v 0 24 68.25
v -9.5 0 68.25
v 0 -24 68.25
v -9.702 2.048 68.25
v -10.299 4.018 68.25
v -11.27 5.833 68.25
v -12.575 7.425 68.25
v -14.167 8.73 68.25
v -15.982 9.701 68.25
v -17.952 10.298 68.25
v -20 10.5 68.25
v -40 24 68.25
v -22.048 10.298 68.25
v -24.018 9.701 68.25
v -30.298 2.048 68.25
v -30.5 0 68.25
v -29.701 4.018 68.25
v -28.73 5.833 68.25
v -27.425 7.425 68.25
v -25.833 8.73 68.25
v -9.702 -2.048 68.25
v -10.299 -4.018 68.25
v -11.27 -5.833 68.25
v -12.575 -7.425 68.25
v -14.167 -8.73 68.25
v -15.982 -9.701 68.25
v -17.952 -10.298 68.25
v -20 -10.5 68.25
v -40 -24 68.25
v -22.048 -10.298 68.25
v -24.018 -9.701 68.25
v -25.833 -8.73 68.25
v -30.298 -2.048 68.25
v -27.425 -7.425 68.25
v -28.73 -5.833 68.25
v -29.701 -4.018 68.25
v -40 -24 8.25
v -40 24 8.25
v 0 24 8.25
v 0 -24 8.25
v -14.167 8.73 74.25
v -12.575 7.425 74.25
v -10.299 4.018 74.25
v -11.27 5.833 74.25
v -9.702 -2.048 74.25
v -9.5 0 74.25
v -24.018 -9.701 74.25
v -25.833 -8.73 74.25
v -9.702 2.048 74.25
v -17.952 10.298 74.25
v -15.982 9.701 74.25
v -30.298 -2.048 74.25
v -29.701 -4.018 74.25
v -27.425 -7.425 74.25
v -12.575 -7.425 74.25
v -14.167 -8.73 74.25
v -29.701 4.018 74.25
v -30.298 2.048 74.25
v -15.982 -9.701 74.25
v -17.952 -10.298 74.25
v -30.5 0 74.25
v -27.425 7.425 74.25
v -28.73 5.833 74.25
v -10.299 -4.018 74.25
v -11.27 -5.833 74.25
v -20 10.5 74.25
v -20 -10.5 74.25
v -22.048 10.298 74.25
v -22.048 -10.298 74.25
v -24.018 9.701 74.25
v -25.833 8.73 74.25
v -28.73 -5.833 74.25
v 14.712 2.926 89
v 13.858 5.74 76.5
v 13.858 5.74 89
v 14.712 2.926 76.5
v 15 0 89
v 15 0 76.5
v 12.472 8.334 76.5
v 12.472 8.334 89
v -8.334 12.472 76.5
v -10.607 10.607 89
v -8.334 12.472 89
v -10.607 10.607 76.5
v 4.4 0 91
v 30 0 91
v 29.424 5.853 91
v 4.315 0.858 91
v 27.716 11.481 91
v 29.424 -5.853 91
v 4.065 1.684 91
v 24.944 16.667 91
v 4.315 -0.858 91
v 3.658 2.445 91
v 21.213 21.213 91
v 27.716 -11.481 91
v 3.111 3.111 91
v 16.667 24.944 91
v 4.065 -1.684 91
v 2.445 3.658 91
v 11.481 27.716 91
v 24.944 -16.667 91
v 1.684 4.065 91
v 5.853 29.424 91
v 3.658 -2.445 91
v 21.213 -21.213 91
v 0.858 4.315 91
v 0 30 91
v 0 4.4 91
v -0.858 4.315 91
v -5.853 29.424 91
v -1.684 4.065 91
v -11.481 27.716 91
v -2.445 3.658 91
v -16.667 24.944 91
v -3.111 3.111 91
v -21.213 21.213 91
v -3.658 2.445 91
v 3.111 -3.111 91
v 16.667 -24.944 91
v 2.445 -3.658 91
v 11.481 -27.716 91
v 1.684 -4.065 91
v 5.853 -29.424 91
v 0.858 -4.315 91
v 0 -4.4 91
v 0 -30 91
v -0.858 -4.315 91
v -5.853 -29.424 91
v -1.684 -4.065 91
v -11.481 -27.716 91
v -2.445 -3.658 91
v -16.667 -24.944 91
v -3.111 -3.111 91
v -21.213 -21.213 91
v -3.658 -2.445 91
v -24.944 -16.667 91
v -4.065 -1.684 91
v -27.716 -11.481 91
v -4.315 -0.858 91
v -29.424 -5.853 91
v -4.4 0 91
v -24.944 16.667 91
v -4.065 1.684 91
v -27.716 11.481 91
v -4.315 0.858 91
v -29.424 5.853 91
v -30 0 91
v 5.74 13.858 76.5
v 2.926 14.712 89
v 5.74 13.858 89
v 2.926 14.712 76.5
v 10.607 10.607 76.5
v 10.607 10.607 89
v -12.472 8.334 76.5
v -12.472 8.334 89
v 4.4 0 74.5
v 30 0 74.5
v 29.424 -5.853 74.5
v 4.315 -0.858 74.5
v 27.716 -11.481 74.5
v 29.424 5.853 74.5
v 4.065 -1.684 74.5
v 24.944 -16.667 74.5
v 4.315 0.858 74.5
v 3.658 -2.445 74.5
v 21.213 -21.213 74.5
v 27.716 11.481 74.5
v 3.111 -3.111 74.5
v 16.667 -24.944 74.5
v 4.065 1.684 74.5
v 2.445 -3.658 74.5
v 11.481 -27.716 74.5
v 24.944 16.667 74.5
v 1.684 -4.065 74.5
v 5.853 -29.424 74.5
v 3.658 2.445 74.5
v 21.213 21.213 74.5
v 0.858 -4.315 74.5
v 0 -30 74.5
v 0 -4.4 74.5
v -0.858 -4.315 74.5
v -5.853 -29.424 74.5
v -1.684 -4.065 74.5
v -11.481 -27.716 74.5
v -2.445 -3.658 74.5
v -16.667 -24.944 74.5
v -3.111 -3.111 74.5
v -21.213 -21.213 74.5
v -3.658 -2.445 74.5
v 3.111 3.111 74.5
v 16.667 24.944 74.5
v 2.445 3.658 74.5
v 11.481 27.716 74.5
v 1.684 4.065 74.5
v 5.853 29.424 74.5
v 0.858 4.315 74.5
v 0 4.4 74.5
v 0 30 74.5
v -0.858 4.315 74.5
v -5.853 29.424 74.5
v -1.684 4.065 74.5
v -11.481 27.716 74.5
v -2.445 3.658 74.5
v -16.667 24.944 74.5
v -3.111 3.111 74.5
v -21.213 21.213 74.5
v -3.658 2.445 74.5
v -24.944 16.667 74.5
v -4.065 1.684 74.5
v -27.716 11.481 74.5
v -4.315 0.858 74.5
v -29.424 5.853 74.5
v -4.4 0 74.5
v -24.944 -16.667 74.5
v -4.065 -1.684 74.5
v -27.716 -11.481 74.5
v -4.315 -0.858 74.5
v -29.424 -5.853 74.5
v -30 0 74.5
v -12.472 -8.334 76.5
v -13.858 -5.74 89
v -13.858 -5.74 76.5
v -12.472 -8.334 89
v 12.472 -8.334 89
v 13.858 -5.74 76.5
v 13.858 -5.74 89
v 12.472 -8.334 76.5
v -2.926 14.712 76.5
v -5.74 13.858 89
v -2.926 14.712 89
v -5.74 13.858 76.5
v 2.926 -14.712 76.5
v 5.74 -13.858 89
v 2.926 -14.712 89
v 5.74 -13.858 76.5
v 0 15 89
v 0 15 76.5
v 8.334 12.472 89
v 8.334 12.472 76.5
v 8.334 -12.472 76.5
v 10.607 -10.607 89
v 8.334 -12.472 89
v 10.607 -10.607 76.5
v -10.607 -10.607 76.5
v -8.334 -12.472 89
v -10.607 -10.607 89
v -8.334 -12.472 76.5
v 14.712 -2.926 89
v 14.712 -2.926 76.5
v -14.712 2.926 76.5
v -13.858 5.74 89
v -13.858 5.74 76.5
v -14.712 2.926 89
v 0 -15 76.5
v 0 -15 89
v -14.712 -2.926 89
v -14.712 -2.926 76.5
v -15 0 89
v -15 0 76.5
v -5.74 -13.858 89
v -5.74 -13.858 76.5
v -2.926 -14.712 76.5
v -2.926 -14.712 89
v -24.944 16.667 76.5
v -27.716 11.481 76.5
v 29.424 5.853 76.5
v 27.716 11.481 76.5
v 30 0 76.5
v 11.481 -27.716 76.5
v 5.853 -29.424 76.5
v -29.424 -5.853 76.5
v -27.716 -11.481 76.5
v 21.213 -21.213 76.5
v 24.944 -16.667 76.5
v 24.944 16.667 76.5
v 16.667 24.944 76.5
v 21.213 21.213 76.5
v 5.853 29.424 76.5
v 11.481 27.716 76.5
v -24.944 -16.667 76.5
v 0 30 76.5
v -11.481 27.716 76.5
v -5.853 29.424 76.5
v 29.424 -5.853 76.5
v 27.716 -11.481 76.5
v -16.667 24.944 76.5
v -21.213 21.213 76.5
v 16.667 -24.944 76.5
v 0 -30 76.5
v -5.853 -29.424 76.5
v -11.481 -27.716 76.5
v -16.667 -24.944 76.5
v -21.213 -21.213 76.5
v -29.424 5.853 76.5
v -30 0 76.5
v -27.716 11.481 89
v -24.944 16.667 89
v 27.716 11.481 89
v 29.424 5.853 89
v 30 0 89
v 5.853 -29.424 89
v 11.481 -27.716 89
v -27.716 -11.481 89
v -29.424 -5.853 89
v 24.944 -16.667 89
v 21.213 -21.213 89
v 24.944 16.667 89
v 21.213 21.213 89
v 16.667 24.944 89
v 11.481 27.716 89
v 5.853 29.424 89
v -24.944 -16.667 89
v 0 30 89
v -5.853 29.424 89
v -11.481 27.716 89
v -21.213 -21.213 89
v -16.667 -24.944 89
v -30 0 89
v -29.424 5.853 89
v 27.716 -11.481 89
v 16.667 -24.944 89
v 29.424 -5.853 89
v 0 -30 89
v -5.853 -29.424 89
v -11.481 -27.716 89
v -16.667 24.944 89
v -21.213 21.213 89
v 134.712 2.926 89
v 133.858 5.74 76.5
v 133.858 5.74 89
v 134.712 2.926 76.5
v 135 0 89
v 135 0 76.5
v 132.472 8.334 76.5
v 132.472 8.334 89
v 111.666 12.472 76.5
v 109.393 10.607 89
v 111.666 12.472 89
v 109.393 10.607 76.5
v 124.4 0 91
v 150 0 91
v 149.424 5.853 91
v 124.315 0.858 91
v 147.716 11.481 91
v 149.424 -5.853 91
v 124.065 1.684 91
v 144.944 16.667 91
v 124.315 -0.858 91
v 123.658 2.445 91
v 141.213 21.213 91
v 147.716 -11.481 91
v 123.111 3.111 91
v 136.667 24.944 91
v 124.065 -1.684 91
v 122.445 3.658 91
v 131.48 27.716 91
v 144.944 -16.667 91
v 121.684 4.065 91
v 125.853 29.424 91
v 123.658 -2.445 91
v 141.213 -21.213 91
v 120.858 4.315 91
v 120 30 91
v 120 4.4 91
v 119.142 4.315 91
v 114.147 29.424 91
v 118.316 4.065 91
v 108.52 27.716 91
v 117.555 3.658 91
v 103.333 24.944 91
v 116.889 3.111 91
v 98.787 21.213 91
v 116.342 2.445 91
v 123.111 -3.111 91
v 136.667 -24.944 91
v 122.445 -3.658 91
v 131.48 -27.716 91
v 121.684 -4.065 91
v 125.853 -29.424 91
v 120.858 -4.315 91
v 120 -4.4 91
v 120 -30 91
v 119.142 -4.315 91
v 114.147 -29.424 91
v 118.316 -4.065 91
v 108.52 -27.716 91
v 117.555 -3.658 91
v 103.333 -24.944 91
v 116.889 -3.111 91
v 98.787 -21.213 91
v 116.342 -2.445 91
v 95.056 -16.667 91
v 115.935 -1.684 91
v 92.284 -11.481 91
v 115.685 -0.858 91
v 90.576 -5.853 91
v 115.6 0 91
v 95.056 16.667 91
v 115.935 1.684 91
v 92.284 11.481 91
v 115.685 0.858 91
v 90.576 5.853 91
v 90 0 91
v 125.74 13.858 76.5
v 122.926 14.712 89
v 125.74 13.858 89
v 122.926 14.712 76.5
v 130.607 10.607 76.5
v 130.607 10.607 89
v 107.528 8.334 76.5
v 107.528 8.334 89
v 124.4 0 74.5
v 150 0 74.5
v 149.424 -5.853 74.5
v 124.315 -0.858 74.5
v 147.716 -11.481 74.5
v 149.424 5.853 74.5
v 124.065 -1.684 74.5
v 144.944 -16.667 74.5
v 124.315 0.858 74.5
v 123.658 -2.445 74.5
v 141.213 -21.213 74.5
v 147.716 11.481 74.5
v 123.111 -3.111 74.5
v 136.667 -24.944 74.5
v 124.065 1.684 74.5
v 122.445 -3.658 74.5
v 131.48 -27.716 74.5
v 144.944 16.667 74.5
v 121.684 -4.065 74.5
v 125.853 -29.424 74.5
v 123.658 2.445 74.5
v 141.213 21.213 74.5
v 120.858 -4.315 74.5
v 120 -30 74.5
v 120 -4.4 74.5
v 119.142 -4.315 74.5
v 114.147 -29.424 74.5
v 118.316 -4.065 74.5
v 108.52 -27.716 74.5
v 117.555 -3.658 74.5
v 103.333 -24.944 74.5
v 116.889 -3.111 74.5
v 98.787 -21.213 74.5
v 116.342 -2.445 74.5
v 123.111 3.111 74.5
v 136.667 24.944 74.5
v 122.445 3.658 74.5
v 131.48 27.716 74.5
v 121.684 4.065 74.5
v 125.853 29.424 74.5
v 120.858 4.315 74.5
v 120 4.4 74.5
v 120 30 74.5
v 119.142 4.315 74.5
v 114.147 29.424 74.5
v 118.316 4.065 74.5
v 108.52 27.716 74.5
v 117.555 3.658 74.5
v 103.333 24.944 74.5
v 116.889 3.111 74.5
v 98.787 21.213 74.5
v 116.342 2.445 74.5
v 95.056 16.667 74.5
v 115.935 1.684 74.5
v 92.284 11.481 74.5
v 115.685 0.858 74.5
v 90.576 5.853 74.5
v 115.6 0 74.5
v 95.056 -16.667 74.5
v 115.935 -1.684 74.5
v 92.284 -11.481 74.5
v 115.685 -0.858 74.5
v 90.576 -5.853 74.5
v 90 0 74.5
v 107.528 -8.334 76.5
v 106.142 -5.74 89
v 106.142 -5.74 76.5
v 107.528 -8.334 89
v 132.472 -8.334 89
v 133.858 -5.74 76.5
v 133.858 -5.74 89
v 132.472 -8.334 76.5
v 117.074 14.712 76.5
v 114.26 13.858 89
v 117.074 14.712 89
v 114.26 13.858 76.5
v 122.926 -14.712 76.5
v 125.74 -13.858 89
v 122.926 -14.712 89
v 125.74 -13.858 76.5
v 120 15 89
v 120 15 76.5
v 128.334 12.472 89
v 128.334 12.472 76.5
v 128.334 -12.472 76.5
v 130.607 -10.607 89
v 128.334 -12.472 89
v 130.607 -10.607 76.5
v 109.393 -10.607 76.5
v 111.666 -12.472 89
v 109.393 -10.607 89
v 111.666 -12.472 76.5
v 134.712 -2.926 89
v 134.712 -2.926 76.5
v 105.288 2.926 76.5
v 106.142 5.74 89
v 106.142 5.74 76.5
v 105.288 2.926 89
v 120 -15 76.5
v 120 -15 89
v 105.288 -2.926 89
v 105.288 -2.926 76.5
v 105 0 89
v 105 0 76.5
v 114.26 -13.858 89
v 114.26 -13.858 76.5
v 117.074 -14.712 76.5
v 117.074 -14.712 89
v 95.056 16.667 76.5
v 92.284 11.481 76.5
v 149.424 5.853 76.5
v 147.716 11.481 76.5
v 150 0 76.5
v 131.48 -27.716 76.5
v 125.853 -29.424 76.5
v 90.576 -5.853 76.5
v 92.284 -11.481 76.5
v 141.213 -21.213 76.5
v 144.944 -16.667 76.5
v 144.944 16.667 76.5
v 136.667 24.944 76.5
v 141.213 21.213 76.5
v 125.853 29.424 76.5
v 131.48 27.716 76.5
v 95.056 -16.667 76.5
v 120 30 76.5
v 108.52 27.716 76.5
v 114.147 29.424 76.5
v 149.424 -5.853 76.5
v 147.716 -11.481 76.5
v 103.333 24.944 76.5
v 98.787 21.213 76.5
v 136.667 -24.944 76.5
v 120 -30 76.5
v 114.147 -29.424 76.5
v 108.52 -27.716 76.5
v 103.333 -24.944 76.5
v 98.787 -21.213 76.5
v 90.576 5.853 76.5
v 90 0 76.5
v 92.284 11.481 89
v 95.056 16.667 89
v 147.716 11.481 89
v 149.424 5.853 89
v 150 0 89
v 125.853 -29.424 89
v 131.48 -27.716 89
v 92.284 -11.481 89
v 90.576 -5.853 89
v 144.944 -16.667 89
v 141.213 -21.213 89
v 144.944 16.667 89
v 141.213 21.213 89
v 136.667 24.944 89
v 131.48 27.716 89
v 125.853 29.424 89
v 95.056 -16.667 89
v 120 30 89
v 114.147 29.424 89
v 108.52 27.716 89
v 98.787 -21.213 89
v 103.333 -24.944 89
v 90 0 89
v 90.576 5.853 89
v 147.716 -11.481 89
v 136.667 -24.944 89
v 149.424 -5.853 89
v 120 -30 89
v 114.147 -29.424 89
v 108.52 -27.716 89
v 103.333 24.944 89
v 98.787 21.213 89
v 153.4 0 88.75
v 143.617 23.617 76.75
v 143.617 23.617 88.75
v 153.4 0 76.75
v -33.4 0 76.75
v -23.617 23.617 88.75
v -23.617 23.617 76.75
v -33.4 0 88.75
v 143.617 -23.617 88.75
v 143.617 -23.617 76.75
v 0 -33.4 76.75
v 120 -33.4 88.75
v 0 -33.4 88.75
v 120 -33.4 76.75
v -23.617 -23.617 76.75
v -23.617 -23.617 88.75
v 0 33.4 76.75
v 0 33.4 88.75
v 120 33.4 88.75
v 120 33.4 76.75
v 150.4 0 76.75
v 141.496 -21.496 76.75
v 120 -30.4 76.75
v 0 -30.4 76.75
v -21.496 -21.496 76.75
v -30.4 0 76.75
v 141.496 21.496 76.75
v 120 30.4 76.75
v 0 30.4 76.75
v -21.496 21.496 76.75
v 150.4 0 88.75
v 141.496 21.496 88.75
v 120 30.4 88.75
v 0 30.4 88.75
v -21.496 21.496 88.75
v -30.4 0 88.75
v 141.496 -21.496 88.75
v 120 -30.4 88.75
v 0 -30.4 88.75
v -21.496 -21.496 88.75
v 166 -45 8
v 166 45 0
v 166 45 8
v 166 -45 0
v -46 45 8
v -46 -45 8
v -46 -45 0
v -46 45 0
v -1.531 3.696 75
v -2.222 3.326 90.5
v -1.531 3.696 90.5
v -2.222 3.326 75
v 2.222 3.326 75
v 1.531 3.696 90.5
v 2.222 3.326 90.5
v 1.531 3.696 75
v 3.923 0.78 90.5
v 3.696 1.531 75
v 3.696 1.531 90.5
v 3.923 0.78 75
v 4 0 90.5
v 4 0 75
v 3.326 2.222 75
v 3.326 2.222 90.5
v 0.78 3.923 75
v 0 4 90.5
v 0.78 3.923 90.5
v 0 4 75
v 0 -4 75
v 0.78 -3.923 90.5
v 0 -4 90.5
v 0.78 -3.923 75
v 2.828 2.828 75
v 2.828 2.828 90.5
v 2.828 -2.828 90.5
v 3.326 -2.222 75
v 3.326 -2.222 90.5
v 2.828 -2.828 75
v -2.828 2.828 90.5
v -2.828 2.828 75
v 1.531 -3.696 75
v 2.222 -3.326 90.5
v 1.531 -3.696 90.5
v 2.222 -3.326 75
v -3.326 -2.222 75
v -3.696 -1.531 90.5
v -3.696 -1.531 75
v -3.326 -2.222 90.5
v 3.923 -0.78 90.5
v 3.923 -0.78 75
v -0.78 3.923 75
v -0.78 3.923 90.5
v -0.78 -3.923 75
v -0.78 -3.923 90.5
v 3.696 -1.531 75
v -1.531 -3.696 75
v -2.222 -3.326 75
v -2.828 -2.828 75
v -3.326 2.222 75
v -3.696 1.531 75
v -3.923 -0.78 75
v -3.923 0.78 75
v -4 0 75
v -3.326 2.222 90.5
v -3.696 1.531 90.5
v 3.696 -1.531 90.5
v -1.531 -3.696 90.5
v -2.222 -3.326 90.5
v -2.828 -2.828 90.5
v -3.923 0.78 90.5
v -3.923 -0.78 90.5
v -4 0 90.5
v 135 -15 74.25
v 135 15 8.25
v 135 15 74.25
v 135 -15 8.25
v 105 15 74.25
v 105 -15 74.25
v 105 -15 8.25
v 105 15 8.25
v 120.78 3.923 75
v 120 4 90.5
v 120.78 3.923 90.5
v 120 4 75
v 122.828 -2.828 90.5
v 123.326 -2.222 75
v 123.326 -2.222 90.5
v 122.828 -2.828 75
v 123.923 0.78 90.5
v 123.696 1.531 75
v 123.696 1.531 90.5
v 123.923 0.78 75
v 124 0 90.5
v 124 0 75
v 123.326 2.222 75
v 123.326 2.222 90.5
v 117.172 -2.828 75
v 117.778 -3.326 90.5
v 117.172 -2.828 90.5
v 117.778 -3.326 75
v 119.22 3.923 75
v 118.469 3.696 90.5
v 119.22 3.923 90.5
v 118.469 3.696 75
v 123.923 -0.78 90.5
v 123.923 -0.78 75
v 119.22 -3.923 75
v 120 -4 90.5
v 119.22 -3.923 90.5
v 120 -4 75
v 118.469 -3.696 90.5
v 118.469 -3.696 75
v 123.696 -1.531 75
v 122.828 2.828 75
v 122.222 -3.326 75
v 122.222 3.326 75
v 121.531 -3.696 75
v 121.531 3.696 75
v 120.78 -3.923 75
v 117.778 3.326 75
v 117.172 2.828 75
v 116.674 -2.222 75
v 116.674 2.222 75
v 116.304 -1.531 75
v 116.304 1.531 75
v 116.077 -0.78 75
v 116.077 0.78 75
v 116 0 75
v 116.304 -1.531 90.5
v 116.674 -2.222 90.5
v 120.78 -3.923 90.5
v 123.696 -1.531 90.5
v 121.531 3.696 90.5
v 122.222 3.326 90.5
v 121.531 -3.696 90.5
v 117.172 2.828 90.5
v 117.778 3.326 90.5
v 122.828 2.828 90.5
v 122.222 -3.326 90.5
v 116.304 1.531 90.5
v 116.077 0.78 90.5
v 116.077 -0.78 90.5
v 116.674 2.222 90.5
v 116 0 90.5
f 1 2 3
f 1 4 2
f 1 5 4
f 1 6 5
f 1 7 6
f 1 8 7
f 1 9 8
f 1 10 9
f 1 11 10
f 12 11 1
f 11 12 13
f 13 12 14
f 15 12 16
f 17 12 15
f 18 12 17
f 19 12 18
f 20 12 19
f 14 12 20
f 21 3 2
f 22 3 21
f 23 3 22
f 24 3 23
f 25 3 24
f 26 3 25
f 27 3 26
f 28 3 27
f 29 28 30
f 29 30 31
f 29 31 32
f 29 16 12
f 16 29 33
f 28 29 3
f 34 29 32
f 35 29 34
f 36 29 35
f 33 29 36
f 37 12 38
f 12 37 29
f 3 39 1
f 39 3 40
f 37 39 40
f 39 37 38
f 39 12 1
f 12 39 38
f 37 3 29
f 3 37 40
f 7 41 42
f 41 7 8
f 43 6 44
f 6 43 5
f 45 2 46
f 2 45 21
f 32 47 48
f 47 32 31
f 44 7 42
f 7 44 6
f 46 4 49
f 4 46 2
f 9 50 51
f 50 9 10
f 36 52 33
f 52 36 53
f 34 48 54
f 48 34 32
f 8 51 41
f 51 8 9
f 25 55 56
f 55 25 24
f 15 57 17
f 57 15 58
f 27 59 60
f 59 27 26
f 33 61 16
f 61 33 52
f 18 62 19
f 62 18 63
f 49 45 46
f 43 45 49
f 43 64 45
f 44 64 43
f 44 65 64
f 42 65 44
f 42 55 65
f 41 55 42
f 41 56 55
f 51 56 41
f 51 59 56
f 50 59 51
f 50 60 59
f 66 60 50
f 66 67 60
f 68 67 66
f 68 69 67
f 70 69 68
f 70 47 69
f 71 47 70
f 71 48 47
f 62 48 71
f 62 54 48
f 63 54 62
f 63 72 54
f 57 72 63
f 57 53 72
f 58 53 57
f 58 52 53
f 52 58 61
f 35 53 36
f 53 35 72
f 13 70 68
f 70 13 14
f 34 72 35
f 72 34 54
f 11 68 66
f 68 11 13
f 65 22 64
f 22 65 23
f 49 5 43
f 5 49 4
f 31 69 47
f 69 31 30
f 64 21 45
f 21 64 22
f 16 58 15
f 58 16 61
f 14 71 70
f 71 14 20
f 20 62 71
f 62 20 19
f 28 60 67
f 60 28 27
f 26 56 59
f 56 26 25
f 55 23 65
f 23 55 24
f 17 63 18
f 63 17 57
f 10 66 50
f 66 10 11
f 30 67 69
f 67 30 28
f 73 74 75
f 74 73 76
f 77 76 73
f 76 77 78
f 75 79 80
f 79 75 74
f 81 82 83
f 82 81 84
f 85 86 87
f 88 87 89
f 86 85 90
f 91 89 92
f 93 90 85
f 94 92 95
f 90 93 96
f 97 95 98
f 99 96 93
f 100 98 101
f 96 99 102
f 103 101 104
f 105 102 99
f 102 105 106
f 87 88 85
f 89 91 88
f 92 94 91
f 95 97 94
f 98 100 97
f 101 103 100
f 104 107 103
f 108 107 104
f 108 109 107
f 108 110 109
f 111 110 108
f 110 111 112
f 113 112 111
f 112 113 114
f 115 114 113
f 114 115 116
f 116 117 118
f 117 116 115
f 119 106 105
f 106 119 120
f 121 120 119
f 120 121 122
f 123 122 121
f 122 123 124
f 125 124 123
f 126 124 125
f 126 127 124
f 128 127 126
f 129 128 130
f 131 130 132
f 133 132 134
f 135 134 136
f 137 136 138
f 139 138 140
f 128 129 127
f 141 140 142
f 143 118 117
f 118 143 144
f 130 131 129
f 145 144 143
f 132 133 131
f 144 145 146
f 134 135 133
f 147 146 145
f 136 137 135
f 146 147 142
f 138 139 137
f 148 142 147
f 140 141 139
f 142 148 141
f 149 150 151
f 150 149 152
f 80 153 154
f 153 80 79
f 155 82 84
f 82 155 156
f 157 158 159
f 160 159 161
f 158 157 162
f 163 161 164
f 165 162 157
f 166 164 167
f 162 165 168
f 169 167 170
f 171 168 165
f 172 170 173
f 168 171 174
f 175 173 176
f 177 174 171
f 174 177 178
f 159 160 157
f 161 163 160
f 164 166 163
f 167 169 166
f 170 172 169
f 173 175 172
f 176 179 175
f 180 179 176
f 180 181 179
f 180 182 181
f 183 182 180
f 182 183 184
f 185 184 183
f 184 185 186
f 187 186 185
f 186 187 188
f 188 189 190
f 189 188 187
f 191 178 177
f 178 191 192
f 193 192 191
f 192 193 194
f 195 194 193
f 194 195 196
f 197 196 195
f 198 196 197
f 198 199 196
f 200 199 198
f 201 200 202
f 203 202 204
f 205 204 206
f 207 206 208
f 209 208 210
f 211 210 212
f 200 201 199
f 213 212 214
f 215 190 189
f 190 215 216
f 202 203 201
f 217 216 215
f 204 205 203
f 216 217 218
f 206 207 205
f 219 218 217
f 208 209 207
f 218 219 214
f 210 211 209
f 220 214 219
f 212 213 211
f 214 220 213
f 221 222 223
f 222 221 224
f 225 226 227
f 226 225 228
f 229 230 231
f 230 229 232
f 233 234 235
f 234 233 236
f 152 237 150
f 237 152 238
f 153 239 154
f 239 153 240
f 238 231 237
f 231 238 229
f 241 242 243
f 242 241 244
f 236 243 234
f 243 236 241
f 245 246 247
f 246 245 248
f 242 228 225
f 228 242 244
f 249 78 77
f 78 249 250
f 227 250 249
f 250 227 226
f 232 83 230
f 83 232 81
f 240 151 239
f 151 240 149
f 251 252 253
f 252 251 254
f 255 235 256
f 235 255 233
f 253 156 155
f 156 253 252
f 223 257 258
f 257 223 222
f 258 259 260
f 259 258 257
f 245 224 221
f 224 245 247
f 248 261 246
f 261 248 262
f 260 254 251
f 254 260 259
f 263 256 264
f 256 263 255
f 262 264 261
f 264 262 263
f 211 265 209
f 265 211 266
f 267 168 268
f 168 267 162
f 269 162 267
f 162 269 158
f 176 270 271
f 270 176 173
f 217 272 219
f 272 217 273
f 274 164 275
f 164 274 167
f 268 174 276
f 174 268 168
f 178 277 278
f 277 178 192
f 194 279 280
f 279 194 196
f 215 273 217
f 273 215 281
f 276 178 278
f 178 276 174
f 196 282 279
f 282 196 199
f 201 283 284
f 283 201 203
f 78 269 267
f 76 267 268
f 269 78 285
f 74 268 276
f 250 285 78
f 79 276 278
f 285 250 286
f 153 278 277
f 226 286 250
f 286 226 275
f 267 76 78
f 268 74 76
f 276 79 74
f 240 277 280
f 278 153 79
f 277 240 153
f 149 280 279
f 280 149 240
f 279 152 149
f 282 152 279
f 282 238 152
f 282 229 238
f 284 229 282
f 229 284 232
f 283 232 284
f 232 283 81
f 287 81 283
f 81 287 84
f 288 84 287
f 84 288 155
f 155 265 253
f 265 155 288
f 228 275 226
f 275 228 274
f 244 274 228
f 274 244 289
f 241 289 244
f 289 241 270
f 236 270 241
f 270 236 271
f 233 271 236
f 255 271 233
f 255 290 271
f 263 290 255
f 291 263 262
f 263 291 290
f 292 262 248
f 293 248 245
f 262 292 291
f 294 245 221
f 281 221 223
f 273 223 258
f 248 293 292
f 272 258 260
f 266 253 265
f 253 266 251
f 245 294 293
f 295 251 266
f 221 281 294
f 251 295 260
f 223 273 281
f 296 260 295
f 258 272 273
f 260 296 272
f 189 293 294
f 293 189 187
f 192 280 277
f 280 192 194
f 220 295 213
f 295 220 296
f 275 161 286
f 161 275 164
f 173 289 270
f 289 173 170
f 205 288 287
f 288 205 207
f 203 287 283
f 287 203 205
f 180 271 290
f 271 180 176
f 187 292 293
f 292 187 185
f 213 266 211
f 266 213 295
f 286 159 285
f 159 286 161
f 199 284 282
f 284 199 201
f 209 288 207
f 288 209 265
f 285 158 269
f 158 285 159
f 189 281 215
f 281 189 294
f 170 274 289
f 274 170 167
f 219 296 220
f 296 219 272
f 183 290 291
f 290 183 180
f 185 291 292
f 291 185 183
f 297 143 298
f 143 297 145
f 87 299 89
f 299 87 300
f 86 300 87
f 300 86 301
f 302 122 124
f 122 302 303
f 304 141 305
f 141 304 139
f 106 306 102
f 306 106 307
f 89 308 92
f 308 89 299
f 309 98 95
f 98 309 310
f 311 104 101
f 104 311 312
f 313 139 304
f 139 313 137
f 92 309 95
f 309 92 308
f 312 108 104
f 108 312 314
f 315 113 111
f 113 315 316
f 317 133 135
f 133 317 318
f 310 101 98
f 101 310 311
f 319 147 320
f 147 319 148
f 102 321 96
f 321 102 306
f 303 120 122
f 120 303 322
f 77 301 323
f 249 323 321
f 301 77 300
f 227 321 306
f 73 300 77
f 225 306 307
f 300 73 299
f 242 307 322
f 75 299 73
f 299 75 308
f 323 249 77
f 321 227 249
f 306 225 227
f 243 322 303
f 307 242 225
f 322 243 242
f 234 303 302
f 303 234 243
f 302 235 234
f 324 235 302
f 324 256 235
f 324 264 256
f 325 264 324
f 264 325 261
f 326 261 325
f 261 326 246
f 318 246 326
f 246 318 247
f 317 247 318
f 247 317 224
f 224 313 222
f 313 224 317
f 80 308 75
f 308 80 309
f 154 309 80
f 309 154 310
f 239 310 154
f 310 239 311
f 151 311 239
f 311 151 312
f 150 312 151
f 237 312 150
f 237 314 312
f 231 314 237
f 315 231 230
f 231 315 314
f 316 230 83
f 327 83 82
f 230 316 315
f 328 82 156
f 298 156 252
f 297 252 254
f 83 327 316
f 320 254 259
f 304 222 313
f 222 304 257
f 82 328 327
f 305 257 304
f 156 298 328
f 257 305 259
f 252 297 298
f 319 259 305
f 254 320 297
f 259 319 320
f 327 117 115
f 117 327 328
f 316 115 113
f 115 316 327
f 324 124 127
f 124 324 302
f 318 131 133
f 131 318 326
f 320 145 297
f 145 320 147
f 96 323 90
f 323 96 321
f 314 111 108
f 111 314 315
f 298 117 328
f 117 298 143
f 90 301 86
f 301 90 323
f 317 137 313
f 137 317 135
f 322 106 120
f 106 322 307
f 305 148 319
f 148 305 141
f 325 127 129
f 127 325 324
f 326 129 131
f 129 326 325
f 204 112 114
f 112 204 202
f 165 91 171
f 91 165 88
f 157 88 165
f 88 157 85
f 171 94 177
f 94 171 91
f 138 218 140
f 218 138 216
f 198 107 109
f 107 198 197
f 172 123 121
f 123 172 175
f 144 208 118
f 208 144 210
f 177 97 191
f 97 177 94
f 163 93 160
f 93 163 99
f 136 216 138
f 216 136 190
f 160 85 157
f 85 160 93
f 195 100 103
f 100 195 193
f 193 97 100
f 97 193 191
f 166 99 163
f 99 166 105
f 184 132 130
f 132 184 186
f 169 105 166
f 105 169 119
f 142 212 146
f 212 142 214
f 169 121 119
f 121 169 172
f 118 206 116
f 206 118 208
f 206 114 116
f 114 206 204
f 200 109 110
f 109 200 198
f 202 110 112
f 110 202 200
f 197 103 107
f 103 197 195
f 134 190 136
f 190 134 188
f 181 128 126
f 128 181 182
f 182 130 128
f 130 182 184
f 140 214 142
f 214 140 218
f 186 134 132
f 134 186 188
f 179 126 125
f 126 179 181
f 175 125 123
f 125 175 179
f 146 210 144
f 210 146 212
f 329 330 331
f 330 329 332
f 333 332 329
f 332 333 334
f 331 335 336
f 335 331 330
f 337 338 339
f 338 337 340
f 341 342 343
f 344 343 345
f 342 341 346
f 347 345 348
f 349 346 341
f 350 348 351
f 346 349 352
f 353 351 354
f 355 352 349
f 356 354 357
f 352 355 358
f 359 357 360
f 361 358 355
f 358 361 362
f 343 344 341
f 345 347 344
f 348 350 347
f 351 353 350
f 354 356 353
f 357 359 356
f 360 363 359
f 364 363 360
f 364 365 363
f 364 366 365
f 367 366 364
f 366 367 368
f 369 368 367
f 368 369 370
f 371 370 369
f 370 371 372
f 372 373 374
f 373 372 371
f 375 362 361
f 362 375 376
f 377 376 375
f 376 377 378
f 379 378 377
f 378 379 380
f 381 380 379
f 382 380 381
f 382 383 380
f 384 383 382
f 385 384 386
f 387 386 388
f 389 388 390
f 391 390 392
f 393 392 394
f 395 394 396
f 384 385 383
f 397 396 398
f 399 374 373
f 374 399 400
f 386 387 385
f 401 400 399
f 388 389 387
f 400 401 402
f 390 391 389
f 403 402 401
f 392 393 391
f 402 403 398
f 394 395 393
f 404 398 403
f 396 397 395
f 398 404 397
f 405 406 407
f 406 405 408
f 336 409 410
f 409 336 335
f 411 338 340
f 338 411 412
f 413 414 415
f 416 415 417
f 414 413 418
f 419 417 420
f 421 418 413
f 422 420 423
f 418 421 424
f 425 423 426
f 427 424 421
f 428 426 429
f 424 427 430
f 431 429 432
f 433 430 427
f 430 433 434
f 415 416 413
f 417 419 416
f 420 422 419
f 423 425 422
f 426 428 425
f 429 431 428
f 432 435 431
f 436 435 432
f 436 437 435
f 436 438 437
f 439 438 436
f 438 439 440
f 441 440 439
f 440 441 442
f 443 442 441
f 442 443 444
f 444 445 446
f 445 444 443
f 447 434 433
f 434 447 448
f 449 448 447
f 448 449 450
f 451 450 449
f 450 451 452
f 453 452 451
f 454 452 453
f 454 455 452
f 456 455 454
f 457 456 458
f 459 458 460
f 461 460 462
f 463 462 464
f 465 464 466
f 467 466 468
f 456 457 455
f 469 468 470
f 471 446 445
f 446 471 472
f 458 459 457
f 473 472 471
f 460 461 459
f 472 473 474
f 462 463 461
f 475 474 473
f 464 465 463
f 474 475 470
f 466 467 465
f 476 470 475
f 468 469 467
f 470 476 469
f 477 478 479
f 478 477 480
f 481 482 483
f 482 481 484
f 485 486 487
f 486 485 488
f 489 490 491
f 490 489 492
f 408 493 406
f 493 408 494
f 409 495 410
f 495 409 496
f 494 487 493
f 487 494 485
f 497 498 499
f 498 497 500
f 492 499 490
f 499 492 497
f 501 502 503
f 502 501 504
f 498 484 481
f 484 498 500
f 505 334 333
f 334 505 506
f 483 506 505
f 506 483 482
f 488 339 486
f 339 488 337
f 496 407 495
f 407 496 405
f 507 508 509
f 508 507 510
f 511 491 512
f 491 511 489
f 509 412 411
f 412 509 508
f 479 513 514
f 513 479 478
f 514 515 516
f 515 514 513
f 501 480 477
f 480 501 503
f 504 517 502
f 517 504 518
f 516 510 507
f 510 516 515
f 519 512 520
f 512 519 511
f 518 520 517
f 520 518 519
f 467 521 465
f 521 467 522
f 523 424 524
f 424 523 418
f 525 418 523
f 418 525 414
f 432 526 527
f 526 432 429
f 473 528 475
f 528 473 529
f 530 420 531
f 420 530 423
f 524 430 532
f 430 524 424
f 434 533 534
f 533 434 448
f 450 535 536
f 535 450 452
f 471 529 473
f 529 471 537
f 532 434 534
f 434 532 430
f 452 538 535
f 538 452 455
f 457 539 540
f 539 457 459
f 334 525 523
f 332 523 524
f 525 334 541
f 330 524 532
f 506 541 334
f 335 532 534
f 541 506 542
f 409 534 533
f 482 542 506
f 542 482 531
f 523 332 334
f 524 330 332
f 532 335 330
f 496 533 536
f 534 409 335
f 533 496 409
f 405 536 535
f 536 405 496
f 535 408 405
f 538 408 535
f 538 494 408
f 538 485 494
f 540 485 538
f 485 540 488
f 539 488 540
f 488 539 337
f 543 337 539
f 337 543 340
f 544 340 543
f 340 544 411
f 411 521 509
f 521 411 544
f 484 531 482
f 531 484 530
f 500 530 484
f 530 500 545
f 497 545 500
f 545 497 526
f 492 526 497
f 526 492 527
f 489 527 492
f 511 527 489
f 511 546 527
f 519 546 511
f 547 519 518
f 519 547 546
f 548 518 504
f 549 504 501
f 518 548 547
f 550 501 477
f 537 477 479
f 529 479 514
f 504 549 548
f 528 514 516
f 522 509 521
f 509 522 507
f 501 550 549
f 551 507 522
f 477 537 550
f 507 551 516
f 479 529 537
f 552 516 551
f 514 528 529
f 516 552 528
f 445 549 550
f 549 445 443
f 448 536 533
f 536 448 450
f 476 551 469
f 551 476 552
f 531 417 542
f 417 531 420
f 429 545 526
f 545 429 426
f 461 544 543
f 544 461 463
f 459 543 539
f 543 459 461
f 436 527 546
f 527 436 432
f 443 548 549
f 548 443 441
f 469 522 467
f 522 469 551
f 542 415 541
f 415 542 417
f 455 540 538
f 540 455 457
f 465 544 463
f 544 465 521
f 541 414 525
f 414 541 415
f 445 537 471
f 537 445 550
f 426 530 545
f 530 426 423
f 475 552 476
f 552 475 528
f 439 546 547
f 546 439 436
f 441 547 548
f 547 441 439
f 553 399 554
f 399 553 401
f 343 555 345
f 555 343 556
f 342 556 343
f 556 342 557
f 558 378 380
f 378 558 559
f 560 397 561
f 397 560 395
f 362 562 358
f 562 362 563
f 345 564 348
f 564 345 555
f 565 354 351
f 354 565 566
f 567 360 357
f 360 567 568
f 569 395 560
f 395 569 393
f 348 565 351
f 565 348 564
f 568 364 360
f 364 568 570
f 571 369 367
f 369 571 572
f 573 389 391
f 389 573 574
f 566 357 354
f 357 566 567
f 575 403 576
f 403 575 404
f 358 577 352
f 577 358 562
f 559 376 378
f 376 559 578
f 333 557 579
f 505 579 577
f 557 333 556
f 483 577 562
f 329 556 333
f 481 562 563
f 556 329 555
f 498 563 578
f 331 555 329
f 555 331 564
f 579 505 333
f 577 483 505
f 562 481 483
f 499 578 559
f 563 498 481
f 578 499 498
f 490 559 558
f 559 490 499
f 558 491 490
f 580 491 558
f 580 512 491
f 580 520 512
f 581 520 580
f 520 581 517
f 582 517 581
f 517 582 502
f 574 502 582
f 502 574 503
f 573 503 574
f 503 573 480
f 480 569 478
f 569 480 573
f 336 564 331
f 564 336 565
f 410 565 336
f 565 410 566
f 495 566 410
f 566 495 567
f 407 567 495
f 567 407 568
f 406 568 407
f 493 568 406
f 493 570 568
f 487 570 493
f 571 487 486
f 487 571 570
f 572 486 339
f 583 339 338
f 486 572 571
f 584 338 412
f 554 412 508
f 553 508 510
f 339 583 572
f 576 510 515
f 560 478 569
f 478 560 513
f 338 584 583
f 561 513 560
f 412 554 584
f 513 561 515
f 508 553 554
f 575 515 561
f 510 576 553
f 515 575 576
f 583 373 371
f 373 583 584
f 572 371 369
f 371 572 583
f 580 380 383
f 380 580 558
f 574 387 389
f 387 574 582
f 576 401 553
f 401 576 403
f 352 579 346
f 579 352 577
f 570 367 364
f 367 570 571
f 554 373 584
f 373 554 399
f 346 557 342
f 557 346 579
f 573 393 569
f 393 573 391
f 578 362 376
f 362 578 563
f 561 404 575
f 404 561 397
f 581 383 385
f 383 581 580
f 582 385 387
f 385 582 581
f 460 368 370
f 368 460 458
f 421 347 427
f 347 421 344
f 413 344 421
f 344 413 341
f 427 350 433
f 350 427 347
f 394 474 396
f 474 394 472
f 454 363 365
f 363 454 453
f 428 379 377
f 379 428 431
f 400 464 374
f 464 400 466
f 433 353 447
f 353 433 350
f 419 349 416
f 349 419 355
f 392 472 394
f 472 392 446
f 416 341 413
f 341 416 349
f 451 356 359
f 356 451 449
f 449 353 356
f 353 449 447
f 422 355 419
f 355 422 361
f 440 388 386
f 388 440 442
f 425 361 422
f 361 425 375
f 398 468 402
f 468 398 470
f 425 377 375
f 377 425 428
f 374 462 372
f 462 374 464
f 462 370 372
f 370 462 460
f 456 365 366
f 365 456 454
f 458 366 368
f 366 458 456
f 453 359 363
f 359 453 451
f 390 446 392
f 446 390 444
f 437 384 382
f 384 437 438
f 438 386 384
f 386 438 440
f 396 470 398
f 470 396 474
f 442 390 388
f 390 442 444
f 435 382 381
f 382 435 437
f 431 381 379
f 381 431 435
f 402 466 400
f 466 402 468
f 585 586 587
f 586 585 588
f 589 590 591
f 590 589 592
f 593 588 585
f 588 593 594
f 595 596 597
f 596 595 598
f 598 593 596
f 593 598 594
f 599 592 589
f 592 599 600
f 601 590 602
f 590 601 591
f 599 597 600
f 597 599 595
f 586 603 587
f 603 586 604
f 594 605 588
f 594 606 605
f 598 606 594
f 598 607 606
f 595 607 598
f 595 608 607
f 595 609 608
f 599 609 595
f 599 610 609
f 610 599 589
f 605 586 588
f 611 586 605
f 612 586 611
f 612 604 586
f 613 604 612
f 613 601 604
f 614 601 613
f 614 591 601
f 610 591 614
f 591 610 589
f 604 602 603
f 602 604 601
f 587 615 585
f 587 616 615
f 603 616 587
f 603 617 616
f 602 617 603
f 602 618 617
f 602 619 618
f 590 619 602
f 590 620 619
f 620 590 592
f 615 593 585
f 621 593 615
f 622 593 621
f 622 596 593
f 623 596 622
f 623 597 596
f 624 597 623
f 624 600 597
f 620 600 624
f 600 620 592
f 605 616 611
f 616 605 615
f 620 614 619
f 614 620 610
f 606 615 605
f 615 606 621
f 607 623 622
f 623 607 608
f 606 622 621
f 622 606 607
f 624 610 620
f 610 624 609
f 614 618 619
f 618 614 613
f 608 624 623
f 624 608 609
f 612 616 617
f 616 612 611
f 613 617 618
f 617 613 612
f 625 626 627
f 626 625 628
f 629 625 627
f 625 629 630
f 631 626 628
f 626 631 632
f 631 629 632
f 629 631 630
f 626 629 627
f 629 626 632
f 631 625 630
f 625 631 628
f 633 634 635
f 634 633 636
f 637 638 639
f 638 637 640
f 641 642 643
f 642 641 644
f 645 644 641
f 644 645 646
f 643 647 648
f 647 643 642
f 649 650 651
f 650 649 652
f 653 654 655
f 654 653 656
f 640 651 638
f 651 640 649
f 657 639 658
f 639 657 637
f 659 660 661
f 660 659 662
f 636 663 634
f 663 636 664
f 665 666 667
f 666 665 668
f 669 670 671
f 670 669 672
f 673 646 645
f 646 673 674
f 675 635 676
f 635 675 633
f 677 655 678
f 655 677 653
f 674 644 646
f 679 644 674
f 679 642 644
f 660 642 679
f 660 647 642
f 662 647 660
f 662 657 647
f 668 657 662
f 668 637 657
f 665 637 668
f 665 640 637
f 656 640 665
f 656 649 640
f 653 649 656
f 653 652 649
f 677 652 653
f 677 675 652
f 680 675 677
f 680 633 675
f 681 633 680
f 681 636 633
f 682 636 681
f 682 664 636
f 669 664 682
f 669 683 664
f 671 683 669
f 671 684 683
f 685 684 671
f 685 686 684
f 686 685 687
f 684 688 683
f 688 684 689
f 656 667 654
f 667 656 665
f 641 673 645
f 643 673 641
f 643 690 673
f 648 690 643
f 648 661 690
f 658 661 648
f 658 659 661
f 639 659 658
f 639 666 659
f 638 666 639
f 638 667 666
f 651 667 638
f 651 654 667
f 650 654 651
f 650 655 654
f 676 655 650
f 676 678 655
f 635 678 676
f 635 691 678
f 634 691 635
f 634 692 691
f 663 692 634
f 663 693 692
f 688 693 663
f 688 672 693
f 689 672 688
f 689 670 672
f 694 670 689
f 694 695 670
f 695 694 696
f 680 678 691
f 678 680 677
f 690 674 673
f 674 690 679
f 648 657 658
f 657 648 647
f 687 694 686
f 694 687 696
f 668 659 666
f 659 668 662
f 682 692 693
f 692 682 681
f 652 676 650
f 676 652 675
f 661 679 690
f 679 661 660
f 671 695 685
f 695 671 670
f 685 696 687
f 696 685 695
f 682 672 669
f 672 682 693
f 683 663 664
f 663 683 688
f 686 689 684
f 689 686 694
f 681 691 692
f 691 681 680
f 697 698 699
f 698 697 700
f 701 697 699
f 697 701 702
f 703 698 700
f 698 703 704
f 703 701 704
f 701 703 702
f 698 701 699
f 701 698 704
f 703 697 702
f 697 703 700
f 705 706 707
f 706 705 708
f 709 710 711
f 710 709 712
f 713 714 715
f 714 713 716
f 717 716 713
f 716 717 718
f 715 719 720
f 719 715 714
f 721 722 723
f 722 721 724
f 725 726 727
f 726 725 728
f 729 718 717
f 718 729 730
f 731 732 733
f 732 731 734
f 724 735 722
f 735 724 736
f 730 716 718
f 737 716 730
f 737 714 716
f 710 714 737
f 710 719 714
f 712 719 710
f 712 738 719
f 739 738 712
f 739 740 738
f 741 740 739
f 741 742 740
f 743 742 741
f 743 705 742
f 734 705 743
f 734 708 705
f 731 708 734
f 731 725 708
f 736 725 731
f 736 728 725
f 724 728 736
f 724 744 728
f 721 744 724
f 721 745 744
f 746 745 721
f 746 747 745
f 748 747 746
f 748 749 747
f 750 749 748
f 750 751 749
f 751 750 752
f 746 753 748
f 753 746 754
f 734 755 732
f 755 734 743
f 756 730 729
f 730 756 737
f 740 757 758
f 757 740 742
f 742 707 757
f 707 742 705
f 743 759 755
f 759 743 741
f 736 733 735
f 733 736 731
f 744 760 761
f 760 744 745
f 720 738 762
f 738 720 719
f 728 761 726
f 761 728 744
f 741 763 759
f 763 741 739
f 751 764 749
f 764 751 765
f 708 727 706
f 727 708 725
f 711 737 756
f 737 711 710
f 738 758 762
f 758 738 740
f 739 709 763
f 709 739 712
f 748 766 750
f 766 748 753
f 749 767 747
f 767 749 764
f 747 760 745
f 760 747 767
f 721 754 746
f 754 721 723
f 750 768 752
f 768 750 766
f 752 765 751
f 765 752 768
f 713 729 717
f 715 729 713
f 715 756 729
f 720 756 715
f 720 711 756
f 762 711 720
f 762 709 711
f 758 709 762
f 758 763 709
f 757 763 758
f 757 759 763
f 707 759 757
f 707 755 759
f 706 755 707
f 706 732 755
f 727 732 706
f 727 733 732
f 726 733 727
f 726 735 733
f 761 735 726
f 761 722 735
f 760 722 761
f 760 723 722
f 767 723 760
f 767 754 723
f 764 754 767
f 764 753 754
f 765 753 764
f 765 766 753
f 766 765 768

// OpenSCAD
$fn = 32;

// ------------------------------------------------------------------------
// Motor belt drive: span 120 mm, pulleys d60, belt 12 mm wide
// Every part is its own module, assembly() places every instance.
// ------------------------------------------------------------------------

// --- part 1 ---
module base_plate() {
  difference() {
    translate([-106, -45, 0]) cube([212, 90, 8]);
  }
}

// --- part 2 ---
module motor() {
  union() {
    translate([-30, -24, 0]) cube([60, 48, 40]);
    translate([33, 0, 20]) rotate([0, 90, 0]) cylinder(h = 6, d = 21, center = true);
  }
}

// --- part 3 ---
module drive_shaft() {
  translate([0, 0, -7.75]) cylinder(h = 15.5, d = 8);
}

// --- part 4 ---
module pulley_drive() {
  difference() {
    union() {
      cylinder(h = 16.5, d = 30);
      cylinder(h = 2, d = 60);
      translate([0, 0, 14.5]) cylinder(h = 2, d = 60);
    }
    translate([0, 0, -1]) cylinder(h = 18.5, d = 8.8);
  }
}

// --- part 5 ---
module idler_post() {
  translate([-15, -15, 0]) cube([30, 30, 66]);
}

// --- part 6 ---
module driven_shaft() {
  translate([0, 0, -7.75]) cylinder(h = 15.5, d = 8);
}

// --- part 7 ---
module pulley_driven() {
  difference() {
    union() {
      cylinder(h = 16.5, d = 30);
      cylinder(h = 2, d = 60);
      translate([0, 0, 14.5]) cylinder(h = 2, d = 60);
    }
    translate([0, 0, -1]) cylinder(h = 18.5, d = 8.8);
  }
}

// --- part 8 ---
module drive_belt() {
  difference() {
    linear_extrude(height = 12) polygon(points = concat([for (a = [90 : 45 : 270]) [33.4 * cos(a), 33.4 * sin(a)]], [for (a = [270 : 45 : 450]) [120 + 33.4 * cos(a), 33.4 * sin(a)]]));
    translate([0, 0, -1]) linear_extrude(height = 14) polygon(points = concat([for (a = [90 : 45 : 270]) [30.4 * cos(a), 30.4 * sin(a)]], [for (a = [270 : 45 : 450]) [120 + 30.4 * cos(a), 30.4 * sin(a)]]));
  }
}

// --- assembly ---
module assembly() {
  color([0.80, 0.24, 0.20]) translate([60, 0, 0]) rotate([0, 0, 0]) base_plate();
  color([0.20, 0.45, 0.75]) translate([0, 0, 38.25]) rotate([0, 270, 0]) motor();
  color([0.25, 0.62, 0.32]) translate([0, 0, 82.75]) rotate([0, 0, 0]) drive_shaft();
  color([0.92, 0.70, 0.18]) translate([0, 0, 74.5]) rotate([0, 0, 0]) pulley_drive();
  color([0.58, 0.35, 0.70]) translate([120, 0, 8.25]) rotate([0, 0, 0]) idler_post();
  color([0.16, 0.66, 0.66]) translate([120, 0, 82.75]) rotate([0, 0, 0]) driven_shaft();
  color([0.85, 0.48, 0.18]) translate([120, 0, 74.5]) rotate([0, 0, 0]) pulley_driven();
  color([0.55, 0.60, 0.65]) translate([0, 0, 76.75]) rotate([0, 0, 0]) drive_belt();
}

assembly();
